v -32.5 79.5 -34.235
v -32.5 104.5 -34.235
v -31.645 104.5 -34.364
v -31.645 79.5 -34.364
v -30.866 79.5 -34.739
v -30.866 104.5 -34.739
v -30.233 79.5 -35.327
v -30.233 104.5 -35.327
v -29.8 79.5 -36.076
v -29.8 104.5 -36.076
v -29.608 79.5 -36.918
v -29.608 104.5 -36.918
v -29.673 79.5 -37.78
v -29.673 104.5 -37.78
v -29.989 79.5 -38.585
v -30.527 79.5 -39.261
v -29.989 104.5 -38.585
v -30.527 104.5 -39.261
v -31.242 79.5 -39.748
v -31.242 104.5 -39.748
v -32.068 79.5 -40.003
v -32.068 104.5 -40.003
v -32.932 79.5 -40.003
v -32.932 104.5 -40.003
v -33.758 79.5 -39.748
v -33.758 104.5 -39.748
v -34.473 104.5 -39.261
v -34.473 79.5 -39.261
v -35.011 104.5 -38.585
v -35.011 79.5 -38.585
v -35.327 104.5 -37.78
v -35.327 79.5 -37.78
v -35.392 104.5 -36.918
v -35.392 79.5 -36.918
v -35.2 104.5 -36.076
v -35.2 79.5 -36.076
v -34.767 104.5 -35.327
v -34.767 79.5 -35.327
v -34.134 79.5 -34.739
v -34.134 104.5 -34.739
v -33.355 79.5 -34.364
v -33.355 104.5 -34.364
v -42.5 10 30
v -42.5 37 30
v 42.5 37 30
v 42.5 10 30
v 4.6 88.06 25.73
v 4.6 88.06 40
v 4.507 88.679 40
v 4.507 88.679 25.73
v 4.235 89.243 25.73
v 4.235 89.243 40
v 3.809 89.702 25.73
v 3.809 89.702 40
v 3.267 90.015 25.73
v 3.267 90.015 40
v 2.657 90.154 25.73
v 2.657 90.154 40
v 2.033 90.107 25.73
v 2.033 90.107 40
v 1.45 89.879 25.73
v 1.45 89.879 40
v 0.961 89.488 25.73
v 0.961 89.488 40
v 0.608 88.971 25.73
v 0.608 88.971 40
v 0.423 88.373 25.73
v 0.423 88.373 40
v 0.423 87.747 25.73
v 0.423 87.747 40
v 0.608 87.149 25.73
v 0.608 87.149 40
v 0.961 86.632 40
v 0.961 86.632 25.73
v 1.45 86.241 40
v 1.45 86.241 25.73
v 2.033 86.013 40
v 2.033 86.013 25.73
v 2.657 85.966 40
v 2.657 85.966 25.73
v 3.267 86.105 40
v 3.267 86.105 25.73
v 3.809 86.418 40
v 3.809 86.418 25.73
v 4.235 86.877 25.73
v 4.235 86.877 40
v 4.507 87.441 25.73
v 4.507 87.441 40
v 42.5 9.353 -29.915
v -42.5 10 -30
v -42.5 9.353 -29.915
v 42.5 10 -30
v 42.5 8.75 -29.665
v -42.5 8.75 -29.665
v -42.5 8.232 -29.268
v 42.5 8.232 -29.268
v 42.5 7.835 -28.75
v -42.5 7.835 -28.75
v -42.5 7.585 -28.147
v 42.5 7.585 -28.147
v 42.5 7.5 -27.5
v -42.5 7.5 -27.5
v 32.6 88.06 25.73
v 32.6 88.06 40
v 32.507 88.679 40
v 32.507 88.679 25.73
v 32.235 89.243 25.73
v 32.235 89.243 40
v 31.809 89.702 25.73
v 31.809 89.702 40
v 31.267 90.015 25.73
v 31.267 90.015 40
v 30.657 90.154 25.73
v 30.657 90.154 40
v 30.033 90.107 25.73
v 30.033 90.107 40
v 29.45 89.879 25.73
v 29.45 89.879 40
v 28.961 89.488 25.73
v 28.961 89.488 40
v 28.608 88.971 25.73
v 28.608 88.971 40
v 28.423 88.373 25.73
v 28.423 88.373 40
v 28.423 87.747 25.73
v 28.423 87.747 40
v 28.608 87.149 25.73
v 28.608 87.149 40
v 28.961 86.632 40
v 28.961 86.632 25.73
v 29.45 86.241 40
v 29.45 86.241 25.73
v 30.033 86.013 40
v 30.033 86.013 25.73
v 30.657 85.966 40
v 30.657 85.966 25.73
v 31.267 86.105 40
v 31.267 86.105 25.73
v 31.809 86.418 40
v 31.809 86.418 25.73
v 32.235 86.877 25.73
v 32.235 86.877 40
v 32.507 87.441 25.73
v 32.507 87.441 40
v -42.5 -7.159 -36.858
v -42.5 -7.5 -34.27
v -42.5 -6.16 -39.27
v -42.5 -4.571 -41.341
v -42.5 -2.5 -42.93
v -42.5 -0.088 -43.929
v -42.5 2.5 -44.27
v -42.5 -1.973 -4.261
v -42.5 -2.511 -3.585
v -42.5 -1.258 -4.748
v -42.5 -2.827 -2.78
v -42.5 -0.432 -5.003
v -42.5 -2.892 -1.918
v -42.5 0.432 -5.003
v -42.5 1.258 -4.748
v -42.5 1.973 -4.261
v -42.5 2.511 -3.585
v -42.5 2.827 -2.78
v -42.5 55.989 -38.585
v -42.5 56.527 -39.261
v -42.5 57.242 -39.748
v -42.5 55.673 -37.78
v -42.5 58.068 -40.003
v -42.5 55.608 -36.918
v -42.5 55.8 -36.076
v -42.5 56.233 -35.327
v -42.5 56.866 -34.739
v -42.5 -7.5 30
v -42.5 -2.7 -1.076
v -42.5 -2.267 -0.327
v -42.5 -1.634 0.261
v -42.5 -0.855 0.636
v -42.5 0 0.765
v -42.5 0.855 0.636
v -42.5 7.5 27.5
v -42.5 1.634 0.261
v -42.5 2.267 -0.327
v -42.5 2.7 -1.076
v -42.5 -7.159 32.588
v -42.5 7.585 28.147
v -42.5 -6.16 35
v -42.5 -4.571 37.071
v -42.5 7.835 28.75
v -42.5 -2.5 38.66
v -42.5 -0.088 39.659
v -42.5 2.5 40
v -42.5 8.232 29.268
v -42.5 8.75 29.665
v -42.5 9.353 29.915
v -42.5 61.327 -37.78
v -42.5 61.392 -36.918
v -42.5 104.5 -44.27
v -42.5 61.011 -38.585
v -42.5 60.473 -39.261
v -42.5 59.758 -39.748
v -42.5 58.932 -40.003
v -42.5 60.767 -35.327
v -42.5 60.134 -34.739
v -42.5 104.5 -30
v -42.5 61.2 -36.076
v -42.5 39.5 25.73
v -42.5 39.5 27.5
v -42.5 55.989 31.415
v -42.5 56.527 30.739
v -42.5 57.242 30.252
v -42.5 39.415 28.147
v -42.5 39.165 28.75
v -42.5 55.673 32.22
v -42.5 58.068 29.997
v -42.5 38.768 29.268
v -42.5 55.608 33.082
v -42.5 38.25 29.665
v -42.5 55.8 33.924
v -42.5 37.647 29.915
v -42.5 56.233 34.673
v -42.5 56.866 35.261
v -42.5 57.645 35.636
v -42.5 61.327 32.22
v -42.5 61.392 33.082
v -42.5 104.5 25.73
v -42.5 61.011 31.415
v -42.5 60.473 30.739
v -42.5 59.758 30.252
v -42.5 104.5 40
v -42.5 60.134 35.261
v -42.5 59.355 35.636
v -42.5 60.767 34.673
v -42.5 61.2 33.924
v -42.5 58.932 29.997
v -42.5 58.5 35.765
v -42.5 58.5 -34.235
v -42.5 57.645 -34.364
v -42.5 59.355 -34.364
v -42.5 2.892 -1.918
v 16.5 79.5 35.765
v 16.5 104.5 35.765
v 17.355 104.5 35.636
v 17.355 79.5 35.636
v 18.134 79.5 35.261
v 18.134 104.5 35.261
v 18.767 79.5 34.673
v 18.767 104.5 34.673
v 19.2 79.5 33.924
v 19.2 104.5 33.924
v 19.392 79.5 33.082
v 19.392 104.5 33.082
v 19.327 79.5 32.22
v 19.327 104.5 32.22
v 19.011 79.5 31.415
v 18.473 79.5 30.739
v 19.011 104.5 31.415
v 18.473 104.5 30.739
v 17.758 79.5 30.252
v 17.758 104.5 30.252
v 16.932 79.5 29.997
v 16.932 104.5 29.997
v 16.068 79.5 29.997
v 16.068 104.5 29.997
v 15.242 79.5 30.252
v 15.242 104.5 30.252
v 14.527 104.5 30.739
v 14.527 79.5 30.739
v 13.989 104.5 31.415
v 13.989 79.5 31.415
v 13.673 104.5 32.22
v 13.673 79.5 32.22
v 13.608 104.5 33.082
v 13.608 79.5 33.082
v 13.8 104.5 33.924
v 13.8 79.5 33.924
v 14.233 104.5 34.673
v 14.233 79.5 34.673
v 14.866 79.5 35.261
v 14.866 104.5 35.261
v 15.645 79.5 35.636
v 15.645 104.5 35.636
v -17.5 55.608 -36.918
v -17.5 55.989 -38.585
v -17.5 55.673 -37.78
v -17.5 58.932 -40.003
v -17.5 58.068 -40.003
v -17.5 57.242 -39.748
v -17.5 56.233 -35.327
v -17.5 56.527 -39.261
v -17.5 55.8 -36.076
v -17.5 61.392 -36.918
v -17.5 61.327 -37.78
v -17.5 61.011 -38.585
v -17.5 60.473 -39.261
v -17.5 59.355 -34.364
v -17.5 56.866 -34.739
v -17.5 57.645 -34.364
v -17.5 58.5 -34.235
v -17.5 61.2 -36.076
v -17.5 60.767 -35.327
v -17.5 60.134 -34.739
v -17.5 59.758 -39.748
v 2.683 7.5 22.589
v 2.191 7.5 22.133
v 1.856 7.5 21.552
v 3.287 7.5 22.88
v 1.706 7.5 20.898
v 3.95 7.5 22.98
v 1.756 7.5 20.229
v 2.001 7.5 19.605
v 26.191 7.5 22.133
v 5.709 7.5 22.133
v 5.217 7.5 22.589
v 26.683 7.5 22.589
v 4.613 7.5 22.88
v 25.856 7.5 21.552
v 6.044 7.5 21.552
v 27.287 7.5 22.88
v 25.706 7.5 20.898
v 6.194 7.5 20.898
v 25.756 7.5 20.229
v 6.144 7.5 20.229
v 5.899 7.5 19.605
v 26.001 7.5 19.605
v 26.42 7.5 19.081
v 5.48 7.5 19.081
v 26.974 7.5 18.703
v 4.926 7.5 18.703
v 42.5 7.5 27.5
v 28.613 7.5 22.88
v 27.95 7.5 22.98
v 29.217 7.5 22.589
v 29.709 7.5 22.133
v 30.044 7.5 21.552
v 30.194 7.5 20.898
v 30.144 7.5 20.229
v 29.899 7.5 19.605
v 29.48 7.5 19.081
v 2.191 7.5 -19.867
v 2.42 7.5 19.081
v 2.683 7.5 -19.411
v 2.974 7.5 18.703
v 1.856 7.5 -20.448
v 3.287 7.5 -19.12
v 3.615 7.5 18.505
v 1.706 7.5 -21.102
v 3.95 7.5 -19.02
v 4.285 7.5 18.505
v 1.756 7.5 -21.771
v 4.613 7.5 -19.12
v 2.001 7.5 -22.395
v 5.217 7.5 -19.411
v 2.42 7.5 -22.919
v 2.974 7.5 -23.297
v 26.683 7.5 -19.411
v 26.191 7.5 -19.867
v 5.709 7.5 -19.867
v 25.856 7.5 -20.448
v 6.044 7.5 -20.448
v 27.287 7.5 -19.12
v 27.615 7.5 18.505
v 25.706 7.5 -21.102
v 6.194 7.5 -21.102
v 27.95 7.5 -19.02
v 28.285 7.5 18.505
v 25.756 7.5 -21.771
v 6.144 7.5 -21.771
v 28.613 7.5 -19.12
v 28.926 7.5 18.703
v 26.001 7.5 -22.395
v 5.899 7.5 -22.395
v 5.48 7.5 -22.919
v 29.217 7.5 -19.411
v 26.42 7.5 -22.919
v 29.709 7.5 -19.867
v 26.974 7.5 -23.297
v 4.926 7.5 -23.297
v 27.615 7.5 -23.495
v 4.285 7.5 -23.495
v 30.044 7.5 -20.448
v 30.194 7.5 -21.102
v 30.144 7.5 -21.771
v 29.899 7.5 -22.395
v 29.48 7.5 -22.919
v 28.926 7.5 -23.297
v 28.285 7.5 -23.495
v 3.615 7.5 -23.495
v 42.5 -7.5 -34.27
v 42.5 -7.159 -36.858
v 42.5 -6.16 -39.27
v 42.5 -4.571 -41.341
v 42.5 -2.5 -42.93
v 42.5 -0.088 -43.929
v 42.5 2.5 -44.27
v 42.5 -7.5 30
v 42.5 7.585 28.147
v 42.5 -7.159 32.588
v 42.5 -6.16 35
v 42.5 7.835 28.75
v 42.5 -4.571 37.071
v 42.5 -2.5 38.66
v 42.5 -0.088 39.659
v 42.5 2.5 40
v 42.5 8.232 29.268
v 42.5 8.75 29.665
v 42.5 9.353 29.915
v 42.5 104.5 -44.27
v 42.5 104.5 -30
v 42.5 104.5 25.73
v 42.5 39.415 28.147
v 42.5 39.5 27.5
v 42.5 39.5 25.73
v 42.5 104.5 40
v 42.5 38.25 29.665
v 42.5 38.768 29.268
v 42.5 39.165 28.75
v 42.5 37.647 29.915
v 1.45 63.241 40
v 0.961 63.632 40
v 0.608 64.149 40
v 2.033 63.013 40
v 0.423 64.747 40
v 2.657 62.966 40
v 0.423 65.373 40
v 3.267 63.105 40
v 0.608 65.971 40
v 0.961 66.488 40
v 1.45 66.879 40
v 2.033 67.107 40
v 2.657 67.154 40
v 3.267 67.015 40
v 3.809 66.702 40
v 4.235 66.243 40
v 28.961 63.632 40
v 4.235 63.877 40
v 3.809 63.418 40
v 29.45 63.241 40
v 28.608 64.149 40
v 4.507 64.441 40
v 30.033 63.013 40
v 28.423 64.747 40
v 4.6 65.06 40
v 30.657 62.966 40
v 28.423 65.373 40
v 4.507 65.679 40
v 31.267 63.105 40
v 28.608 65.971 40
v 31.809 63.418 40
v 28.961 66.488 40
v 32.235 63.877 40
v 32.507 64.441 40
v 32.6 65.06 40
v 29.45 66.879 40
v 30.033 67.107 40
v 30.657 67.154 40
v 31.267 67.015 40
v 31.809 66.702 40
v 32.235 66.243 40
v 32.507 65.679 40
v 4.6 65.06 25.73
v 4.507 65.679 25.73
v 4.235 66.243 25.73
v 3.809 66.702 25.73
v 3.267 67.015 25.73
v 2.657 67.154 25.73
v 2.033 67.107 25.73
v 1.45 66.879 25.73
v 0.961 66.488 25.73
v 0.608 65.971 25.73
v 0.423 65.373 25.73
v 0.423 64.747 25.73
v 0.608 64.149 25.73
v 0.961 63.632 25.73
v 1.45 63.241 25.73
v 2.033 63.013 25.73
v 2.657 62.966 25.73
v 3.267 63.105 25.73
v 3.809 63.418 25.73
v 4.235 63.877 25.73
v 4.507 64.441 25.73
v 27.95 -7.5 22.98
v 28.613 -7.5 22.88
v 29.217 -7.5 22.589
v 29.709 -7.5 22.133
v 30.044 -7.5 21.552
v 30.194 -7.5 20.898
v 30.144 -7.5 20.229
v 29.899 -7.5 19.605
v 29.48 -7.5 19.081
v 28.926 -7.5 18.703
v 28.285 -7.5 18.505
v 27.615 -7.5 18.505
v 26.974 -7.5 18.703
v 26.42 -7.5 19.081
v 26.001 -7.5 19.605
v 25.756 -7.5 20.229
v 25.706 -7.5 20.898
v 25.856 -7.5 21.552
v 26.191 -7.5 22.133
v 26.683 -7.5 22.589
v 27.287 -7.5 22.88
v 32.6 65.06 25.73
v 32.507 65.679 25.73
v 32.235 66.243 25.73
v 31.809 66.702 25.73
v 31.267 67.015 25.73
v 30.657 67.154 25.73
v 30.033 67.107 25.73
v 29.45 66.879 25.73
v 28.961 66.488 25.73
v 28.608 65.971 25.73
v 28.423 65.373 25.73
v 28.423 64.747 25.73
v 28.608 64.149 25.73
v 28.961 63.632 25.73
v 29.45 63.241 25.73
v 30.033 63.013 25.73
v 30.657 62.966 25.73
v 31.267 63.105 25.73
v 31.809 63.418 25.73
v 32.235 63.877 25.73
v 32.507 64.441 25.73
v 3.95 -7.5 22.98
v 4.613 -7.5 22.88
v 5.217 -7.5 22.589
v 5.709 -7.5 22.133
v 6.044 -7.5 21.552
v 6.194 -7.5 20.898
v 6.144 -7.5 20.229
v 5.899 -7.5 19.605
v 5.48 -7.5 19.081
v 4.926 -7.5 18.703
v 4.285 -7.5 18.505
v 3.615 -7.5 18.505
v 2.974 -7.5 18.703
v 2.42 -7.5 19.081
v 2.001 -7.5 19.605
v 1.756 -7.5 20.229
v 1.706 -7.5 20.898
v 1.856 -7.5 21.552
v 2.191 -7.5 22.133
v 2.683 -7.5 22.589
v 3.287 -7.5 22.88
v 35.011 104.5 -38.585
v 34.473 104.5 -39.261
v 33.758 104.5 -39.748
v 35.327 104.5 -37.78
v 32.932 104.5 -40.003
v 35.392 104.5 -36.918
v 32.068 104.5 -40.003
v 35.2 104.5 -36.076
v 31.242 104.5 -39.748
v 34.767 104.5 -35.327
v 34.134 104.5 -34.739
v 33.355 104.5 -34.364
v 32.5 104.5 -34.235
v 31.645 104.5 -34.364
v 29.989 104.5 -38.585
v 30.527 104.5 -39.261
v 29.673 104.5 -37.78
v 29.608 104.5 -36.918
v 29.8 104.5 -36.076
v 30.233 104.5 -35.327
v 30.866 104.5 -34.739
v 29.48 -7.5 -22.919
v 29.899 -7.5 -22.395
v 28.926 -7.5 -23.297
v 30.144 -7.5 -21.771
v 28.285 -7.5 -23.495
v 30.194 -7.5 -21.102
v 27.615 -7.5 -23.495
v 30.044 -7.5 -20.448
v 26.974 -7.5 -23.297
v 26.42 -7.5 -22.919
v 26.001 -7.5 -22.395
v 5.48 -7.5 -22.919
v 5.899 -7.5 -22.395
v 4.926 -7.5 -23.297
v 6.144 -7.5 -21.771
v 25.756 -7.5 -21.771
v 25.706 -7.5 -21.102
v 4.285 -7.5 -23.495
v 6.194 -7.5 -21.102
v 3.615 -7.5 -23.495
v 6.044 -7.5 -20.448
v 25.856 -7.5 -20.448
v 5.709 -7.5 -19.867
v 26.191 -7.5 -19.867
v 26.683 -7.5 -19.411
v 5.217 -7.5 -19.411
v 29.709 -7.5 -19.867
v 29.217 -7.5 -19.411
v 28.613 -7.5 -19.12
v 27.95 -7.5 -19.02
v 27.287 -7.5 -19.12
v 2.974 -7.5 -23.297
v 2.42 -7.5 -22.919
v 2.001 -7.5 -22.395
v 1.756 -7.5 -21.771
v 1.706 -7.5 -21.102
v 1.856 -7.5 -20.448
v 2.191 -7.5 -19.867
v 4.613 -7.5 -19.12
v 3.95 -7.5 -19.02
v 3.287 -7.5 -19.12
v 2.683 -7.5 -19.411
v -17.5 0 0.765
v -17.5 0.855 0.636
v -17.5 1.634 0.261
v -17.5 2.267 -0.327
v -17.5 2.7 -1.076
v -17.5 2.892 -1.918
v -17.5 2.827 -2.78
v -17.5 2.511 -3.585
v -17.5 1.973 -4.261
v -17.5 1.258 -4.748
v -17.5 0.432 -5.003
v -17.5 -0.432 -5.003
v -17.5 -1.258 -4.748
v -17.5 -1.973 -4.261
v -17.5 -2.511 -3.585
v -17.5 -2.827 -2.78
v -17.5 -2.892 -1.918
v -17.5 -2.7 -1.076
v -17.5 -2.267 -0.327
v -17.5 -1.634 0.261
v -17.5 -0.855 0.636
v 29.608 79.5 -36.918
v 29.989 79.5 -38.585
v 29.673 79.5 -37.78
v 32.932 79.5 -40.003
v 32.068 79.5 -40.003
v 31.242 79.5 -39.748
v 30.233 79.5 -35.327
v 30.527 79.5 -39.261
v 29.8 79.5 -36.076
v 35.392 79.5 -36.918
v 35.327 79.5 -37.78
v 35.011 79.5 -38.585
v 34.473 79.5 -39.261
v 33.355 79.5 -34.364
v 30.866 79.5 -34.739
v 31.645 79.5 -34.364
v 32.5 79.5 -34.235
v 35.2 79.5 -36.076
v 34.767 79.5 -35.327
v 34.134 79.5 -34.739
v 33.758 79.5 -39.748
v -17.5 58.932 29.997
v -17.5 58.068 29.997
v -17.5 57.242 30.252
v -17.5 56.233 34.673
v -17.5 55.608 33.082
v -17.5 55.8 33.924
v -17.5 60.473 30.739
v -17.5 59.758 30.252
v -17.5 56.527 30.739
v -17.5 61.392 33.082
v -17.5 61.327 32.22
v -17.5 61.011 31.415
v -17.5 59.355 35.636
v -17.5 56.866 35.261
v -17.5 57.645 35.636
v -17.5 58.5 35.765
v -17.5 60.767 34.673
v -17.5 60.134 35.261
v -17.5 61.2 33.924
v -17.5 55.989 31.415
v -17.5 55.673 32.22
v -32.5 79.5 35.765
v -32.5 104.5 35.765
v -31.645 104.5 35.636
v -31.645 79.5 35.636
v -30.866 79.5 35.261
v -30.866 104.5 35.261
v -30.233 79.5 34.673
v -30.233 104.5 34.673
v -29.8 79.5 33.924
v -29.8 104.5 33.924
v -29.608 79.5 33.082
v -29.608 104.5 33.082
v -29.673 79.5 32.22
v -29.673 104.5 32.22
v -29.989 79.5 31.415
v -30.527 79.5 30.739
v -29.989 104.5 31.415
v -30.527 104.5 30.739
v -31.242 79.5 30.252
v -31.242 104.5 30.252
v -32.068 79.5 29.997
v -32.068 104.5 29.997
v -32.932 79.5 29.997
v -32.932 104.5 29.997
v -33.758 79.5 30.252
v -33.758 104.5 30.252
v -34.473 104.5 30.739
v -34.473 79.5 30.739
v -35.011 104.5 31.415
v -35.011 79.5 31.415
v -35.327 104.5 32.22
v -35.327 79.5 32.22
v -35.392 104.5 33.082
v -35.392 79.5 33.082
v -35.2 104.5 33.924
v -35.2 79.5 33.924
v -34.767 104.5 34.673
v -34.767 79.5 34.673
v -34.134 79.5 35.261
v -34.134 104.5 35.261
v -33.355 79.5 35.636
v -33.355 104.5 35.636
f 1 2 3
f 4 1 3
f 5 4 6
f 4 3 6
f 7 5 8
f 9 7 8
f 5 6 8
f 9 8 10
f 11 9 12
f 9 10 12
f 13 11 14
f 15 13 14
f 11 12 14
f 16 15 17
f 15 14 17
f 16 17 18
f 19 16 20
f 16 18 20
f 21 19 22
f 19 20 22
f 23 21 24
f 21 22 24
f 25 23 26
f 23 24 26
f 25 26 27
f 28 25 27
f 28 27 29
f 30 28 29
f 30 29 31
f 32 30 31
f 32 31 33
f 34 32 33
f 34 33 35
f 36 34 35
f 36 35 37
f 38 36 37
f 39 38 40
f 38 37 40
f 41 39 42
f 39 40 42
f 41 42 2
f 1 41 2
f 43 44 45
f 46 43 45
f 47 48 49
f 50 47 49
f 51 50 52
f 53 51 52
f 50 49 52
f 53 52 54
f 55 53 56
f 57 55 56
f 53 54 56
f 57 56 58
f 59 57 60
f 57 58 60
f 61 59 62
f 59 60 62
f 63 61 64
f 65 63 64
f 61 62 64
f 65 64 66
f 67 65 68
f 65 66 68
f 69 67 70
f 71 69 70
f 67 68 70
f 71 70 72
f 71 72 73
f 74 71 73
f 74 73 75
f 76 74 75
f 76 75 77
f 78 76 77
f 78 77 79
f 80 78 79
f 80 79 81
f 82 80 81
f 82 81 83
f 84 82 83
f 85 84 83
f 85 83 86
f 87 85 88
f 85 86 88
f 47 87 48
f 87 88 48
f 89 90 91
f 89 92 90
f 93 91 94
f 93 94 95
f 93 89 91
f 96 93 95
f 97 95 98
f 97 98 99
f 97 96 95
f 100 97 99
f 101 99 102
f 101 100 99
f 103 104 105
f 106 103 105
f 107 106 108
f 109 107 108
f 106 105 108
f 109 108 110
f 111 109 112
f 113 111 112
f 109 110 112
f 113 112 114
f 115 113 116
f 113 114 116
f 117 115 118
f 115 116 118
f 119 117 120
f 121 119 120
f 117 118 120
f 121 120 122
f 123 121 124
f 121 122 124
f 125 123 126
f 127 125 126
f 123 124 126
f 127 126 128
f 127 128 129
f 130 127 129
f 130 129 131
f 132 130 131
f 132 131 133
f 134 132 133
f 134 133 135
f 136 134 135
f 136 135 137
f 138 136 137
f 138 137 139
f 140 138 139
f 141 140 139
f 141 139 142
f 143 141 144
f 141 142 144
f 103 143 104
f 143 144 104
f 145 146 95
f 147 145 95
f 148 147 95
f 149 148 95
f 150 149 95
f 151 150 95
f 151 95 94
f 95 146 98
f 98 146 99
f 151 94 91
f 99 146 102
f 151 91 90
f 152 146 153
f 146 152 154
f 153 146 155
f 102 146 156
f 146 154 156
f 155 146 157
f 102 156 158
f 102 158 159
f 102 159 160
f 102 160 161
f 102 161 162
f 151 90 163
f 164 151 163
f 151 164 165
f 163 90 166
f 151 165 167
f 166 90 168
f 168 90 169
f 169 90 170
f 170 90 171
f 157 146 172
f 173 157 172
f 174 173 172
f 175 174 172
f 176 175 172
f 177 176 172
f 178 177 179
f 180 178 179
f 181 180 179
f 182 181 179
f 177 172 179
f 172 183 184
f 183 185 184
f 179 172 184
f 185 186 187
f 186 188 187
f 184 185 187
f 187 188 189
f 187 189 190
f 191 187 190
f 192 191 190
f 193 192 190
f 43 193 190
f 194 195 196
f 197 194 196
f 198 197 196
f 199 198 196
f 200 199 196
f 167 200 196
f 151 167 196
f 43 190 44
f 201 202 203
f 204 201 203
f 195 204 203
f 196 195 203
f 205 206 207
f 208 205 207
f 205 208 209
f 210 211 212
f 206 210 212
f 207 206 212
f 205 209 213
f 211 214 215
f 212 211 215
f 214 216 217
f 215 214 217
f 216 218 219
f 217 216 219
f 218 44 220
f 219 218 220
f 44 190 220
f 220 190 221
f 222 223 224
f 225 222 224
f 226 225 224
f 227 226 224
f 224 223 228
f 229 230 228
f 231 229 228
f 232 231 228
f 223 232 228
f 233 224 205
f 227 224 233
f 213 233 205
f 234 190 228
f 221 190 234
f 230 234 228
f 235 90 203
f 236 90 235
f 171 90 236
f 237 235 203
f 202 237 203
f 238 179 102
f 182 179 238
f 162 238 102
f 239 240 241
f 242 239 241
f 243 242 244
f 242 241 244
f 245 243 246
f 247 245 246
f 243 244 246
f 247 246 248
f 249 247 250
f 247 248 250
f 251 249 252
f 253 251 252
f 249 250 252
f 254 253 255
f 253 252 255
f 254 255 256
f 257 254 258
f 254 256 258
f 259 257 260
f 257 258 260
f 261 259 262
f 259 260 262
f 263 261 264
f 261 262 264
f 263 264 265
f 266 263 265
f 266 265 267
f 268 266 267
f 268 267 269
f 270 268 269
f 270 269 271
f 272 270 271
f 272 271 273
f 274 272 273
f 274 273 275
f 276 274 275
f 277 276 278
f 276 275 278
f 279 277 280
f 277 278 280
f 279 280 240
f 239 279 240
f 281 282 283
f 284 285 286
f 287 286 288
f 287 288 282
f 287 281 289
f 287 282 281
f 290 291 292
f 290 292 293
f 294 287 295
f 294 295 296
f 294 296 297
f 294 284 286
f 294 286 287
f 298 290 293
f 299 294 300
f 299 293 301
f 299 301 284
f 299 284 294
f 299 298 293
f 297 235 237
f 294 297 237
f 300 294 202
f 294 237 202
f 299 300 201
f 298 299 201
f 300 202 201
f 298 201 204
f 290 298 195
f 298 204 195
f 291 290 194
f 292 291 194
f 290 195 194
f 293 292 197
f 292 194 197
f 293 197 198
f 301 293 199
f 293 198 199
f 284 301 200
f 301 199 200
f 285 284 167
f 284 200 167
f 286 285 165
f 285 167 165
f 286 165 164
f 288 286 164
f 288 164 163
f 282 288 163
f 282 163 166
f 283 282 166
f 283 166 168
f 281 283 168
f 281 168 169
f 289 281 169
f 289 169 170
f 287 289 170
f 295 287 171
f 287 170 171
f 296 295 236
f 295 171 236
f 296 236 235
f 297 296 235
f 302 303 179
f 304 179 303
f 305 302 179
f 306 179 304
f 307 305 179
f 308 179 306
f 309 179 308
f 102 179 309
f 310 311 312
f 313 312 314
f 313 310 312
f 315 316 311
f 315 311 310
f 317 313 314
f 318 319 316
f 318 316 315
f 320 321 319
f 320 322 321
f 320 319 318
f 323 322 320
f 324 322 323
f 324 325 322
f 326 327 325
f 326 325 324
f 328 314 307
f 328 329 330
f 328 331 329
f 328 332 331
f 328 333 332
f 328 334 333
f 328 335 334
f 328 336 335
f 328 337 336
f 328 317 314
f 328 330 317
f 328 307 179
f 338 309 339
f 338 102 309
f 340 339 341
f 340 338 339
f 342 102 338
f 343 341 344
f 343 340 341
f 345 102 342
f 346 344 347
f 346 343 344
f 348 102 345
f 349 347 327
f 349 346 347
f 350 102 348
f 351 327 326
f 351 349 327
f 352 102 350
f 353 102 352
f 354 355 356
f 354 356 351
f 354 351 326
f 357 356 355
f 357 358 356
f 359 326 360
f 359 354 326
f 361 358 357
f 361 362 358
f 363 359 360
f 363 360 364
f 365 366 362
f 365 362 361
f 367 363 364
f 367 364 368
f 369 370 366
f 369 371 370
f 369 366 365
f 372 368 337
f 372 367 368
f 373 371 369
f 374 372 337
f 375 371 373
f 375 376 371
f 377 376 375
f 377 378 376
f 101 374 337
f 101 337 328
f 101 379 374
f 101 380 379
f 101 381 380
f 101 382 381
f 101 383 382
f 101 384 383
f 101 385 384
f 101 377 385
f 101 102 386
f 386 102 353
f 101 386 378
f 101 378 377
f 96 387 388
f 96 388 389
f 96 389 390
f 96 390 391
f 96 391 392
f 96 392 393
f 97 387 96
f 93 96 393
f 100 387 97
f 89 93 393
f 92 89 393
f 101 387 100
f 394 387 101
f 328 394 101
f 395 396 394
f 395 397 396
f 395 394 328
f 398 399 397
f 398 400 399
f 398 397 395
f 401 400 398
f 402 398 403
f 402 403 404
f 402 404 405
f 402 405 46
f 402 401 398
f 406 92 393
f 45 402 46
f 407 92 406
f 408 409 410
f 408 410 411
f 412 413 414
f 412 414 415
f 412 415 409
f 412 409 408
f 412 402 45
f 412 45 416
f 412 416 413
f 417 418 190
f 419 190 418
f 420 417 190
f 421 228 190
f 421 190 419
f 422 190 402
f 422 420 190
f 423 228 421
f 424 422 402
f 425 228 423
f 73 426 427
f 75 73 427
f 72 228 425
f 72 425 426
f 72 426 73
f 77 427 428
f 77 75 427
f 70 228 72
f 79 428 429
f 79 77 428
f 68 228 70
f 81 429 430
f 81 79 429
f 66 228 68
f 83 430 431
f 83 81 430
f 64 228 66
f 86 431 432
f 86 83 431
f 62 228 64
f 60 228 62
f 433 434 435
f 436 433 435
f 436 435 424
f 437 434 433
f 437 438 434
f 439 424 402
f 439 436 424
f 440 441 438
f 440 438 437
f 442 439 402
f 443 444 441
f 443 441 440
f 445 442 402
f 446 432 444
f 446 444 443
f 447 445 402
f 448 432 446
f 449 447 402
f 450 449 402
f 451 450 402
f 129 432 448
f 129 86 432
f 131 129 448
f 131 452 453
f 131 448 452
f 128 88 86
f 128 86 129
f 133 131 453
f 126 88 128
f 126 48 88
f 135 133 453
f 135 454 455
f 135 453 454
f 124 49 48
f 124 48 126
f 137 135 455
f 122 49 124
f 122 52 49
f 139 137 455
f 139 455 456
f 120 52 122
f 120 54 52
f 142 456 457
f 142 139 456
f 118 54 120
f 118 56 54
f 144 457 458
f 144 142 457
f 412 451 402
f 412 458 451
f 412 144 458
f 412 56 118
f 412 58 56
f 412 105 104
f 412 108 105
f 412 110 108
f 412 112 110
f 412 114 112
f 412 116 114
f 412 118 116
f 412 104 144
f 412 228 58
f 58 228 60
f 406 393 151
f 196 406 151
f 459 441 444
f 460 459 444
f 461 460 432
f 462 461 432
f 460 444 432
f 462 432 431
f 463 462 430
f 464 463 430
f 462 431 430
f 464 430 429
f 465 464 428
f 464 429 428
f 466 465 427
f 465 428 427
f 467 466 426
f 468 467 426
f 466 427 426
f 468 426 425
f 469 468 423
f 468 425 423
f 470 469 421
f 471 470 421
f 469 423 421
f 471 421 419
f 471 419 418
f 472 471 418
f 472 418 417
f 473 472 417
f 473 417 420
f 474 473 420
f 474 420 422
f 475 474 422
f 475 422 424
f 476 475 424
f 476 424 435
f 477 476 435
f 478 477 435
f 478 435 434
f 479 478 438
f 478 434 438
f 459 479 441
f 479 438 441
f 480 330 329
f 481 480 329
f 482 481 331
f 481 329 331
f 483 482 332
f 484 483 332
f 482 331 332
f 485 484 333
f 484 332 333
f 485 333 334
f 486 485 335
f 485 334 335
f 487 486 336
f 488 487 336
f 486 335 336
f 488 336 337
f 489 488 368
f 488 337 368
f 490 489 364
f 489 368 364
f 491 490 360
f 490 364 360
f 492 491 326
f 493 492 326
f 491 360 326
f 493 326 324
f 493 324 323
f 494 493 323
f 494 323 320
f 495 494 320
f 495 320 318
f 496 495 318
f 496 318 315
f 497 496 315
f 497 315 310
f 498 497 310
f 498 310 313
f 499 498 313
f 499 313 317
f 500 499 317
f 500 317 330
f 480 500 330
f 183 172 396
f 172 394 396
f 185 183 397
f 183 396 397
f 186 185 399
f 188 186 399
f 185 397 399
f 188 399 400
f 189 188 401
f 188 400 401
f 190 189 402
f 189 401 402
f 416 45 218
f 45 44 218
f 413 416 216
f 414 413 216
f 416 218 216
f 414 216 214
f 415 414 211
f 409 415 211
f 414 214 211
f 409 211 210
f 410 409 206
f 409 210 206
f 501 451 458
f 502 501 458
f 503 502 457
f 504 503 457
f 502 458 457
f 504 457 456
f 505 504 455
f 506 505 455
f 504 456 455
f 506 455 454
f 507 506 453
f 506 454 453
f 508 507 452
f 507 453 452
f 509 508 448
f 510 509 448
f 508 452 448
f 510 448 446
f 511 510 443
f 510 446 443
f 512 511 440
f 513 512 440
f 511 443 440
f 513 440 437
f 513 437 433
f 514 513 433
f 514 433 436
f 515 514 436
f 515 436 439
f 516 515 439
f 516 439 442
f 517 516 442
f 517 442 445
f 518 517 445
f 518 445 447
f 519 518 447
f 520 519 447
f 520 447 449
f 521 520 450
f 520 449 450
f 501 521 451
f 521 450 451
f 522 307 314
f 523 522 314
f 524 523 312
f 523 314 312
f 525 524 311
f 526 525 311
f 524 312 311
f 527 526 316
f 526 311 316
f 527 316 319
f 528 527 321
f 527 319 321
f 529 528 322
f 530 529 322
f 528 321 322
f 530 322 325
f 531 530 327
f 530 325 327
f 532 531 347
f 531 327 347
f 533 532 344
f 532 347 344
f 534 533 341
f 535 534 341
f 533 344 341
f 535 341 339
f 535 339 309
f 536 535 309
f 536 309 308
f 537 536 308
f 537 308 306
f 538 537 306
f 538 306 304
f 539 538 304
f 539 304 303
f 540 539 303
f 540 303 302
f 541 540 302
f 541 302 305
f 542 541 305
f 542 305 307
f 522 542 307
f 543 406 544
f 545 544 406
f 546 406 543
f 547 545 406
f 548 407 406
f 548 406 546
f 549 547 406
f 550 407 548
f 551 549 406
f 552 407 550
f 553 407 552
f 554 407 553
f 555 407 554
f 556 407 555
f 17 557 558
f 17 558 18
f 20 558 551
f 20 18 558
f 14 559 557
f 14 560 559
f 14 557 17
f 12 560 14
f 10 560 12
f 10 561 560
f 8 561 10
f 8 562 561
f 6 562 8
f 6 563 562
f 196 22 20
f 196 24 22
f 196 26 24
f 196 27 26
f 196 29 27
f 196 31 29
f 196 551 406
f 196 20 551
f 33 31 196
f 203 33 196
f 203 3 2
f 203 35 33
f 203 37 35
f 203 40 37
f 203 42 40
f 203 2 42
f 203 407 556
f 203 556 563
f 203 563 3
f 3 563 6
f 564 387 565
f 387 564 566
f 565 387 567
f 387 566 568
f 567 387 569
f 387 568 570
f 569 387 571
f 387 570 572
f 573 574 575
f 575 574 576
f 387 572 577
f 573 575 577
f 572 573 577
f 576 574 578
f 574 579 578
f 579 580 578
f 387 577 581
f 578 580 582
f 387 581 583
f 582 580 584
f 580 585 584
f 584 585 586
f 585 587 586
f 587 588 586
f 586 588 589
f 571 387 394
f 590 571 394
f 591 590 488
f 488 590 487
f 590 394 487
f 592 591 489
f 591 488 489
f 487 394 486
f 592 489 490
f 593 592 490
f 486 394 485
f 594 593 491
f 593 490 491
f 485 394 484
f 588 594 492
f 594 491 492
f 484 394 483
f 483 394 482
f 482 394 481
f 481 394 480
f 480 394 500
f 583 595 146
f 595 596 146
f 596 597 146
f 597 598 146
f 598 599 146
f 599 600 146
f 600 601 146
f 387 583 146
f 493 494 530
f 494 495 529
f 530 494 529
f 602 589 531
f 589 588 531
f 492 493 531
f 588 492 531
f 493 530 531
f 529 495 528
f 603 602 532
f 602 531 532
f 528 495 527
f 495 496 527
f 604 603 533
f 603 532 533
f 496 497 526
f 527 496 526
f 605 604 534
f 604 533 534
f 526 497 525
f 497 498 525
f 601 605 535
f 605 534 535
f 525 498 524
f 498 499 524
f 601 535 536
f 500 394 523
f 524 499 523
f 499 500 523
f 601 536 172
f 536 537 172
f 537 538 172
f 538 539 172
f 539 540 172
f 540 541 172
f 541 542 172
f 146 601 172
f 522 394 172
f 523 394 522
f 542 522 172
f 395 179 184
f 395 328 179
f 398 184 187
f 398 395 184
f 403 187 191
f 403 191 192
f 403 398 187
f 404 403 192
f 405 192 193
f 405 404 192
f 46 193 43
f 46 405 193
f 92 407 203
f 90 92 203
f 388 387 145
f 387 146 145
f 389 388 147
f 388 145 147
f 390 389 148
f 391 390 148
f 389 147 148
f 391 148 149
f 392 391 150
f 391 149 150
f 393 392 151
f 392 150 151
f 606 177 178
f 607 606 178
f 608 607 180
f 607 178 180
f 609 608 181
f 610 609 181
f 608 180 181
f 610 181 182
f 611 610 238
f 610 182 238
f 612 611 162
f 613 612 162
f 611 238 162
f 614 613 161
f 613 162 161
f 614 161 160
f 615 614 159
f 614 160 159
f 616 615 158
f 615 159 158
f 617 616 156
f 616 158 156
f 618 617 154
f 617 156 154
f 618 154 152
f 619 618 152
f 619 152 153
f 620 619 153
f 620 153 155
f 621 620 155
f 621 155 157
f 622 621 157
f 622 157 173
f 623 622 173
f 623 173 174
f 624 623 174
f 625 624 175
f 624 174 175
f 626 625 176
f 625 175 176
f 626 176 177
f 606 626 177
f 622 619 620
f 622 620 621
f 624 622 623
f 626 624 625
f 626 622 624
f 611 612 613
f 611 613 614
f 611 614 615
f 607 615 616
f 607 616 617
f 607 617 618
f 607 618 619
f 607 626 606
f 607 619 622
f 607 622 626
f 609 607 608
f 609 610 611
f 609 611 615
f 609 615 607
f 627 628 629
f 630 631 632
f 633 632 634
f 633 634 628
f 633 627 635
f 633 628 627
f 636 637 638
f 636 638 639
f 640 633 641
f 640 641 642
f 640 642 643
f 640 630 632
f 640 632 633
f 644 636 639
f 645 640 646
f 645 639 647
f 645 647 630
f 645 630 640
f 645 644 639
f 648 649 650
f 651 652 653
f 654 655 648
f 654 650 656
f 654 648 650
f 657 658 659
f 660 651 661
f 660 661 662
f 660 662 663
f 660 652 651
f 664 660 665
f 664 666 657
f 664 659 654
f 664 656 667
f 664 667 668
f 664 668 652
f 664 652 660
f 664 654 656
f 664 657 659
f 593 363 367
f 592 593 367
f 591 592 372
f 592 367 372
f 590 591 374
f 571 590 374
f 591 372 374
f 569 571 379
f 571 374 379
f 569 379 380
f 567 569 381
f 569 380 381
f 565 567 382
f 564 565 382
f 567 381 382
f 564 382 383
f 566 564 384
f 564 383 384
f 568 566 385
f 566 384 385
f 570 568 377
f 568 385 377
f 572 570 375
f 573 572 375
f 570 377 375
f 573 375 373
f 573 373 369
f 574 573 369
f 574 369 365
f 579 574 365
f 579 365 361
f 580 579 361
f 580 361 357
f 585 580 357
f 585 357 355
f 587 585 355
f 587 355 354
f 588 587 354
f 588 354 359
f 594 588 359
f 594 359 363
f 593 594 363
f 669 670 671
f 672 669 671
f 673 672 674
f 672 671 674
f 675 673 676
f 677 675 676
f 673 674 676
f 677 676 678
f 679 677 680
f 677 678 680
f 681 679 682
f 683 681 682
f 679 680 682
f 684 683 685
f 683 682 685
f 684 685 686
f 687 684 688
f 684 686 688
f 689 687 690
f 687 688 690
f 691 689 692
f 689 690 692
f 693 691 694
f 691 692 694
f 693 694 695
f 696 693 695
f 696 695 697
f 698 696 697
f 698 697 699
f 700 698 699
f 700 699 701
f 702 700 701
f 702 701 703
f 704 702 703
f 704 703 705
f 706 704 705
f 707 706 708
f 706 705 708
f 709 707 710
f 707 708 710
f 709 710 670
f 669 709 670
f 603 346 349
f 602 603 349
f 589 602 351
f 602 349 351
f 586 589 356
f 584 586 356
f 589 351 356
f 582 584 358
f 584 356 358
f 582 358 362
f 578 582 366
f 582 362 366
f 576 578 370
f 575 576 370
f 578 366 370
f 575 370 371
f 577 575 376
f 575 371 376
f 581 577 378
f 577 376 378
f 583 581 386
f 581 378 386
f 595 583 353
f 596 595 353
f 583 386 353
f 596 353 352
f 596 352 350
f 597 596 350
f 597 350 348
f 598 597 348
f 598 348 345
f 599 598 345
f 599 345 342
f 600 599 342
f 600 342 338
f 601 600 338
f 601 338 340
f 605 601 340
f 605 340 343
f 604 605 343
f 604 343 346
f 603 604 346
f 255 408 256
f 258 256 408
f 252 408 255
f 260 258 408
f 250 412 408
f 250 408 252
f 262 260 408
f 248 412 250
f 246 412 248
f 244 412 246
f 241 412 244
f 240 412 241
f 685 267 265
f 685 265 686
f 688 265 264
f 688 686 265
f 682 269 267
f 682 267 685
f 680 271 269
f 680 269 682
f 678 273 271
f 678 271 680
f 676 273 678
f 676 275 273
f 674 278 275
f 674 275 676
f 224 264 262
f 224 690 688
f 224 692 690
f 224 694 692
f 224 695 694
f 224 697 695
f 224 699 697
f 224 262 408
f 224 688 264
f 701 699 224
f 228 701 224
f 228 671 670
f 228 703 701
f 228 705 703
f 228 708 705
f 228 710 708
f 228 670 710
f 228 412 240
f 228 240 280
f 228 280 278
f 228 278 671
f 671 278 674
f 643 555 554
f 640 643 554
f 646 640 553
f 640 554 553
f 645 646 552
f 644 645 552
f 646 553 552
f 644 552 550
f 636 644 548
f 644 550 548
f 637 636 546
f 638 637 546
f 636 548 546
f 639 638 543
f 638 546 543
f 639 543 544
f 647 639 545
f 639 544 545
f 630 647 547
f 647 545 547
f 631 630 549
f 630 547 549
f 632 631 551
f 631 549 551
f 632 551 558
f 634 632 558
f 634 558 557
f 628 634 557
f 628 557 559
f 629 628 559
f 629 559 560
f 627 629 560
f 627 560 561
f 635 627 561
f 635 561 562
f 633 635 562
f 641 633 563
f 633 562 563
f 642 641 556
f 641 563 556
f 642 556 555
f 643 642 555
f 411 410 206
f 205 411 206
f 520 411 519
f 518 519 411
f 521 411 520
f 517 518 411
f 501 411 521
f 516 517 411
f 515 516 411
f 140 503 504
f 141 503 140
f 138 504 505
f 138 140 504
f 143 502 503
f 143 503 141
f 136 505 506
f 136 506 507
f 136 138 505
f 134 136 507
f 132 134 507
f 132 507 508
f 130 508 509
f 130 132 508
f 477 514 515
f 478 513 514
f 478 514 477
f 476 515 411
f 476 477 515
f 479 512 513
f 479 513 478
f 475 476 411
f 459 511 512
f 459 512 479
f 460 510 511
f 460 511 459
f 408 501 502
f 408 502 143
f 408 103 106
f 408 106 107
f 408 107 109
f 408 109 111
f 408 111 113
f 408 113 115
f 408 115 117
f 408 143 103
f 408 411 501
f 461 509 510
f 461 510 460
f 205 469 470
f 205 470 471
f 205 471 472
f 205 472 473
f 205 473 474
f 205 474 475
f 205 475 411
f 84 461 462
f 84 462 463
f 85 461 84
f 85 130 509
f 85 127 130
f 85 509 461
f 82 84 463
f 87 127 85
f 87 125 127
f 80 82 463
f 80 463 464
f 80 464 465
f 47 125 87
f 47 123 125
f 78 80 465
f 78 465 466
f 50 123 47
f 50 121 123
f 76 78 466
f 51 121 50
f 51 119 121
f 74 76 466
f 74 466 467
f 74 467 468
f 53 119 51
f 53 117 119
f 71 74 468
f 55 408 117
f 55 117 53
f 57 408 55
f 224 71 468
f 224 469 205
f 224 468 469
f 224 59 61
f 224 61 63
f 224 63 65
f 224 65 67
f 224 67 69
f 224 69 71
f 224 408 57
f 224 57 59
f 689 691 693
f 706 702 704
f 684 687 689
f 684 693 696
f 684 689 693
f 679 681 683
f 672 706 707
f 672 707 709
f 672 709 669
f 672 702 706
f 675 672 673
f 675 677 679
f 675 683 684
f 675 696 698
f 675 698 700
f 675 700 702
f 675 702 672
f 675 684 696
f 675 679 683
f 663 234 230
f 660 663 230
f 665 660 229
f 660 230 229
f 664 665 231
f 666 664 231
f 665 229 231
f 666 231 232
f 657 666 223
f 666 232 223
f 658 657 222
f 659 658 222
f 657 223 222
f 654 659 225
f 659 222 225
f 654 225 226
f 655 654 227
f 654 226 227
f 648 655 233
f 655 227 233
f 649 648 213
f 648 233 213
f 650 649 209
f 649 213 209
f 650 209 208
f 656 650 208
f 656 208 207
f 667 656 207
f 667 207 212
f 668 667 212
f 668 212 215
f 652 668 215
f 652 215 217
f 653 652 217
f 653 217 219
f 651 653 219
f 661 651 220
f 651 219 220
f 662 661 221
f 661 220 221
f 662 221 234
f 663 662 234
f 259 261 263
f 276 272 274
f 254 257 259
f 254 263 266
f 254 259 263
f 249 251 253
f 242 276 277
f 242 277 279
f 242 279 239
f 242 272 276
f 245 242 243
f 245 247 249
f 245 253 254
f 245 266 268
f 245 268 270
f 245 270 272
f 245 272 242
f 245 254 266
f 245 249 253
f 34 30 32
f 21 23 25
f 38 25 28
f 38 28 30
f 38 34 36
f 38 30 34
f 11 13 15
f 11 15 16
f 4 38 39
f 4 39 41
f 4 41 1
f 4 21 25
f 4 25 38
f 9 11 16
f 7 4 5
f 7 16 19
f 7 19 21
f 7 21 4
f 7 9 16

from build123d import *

# Parameters (mm, degrees)
SKETCH1_W           = 85
SKETCH1_H           = 60
BOSS_EXTRUDE1_DEPTH = 7.5
SKETCH2_R           = 2.25
CUT_EXTRUDE1_DEPTH  = 55.141019569
SKETCH3_W           = 85
SKETCH3_H           = 112
BOSS_EXTRUDE2_DEPTH = 10
FILLET1_R           = 10
SKETCH4_W           = 85
SKETCH4_H           = 65
BOSS_EXTRUDE3_DEPTH = 4.27
SKETCH5_W           = 85
SKETCH5_H           = 112
BOSS_EXTRUDE4_DEPTH = 14.27
FILLET2_R           = 10
FILLET3_R           = 2.5
FILLET4_R           = 2.5
FILLET5_R           = 2.5
SKETCH8_R           = 2.9
CUT_EXTRUDE2_DEPTH  = 25
SKETCH9_R           = 2.1
CUT_EXTRUDE3_DEPTH  = 14.27
SKETCH6_R           = 2.9
CUT_EXTRUDE4_DEPTH  = 25


with BuildPart() as part:
    # Sketch1 → Boss-Extrude1 (new, symmetric)
    with BuildSketch(Plane(origin=(0, 0, 0), x_dir=(1, 0, 0), z_dir=(0, 1, 0))):
        Rectangle(SKETCH1_W, SKETCH1_H)
    extrude(amount=BOSS_EXTRUDE1_DEPTH, both=True)

    # Sketch2 → Cut-Extrude1 (cut, through all)
    with BuildSketch(Plane(origin=(0, 7.5, 0), x_dir=(1, 0, 0), z_dir=(0, 1, 0))):
        with Locations(Location((3.95, -20.73, 0), (0, 0, 270))):
            Circle(SKETCH2_R)
        with Locations(Location((3.95, 21.27, 0), (0, 0, 270))):
            Circle(SKETCH2_R)
        with Locations(Location((27.95, 21.27, 0), (0, 0, 270))):
            Circle(SKETCH2_R)
        with Locations(Location((27.95, -20.73, 0), (0, 0, 270))):
            Circle(SKETCH2_R)
    extrude(amount=-CUT_EXTRUDE1_DEPTH, mode=Mode.SUBTRACT)

    # Sketch3 → Boss-Extrude2 (add)
    with BuildSketch(Plane.XY.offset(30)):
        with Locations((0, 48.5)):
            Rectangle(SKETCH3_W, SKETCH3_H)
    extrude(amount=BOSS_EXTRUDE2_DEPTH)

    # Fillet1
    fillet1_edges = [part.edges().sort_by_distance(p)[0] for p in [
        (0, -7.5, 40),
    ]]
    fillet(fillet1_edges, radius=FILLET1_R)

    # Sketch4 → Boss-Extrude3 (add)
    with BuildSketch(Plane(origin=(0, 0, 30), x_dir=(-1, 0, 0), z_dir=(0, 0, -1))):
        with Locations((0, 72)):
            Rectangle(SKETCH4_W, SKETCH4_H)
    extrude(amount=BOSS_EXTRUDE3_DEPTH)

    # Sketch5 → Boss-Extrude4 (add)
    with BuildSketch(Plane(origin=(0, 0, -30), x_dir=(-1, 0, 0), z_dir=(0, 0, -1))):
        with Locations((0, 48.5)):
            Rectangle(SKETCH5_W, SKETCH5_H)
    extrude(amount=BOSS_EXTRUDE4_DEPTH)

    # Fillet2
    fillet2_edges = [part.edges().sort_by_distance(p)[0] for p in [
        (0, -7.5, -44.27),
    ]]
    fillet(fillet2_edges, radius=FILLET2_R)

    # Fillet3
    fillet3_edges = [part.edges().sort_by_distance(p)[0] for p in [
        (0, 7.5, -30),
    ]]
    fillet(fillet3_edges, radius=FILLET3_R)

    # Fillet4
    fillet4_edges = [part.edges().sort_by_distance(p)[0] for p in [
        (0, 7.5, 30),
    ]]
    fillet(fillet4_edges, radius=FILLET4_R)

    # Fillet5
    fillet5_edges = [part.edges().sort_by_distance(p)[0] for p in [
        (0, 39.5, 30),
    ]]
    fillet(fillet5_edges, radius=FILLET5_R)

    # Sketch8 → Cut-Extrude2 (cut)
    with BuildSketch(Plane(origin=(0, 104.5, 0), x_dir=(1, 0, 0), z_dir=(0, 1, 0))):
        with Locations(Location((32.5, 37.135, 0), (0, 0, 270))):
            Circle(SKETCH8_R)
        with Locations(Location((-32.5, -32.865, 0), (0, 0, 270))):
            Circle(SKETCH8_R)
        with Locations(Location((-32.5, 37.135, 0), (0, 0, 270))):
            Circle(SKETCH8_R)
        with Locations(Location((16.5, -32.865, 0), (0, 0, 270))):
            Circle(SKETCH8_R)
    extrude(amount=-CUT_EXTRUDE2_DEPTH, mode=Mode.SUBTRACT)

    # Sketch9 → Cut-Extrude3 (cut)
    with BuildSketch(Plane.XY.offset(40)):
        with Locations((30.5, 88.06)):
            Circle(SKETCH9_R)
        with Locations((30.5, 65.06)):
            Circle(SKETCH9_R)
        with Locations((2.5, 65.06)):
            Circle(SKETCH9_R)
        with Locations((2.5, 88.06)):
            Circle(SKETCH9_R)
    extrude(amount=-CUT_EXTRUDE3_DEPTH, mode=Mode.SUBTRACT)

    # Sketch6 → Cut-Extrude4 (cut)
    with BuildSketch(Plane.ZY.offset(42.5)):
        with Locations((-37.135, 58.5)):
            Circle(SKETCH6_R)
        with Locations((32.865, 58.5)):
            Circle(SKETCH6_R)
        with Locations((-2.135, 0)):
            Circle(SKETCH6_R)
    extrude(amount=-CUT_EXTRUDE4_DEPTH, mode=Mode.SUBTRACT)


solid = part.part
